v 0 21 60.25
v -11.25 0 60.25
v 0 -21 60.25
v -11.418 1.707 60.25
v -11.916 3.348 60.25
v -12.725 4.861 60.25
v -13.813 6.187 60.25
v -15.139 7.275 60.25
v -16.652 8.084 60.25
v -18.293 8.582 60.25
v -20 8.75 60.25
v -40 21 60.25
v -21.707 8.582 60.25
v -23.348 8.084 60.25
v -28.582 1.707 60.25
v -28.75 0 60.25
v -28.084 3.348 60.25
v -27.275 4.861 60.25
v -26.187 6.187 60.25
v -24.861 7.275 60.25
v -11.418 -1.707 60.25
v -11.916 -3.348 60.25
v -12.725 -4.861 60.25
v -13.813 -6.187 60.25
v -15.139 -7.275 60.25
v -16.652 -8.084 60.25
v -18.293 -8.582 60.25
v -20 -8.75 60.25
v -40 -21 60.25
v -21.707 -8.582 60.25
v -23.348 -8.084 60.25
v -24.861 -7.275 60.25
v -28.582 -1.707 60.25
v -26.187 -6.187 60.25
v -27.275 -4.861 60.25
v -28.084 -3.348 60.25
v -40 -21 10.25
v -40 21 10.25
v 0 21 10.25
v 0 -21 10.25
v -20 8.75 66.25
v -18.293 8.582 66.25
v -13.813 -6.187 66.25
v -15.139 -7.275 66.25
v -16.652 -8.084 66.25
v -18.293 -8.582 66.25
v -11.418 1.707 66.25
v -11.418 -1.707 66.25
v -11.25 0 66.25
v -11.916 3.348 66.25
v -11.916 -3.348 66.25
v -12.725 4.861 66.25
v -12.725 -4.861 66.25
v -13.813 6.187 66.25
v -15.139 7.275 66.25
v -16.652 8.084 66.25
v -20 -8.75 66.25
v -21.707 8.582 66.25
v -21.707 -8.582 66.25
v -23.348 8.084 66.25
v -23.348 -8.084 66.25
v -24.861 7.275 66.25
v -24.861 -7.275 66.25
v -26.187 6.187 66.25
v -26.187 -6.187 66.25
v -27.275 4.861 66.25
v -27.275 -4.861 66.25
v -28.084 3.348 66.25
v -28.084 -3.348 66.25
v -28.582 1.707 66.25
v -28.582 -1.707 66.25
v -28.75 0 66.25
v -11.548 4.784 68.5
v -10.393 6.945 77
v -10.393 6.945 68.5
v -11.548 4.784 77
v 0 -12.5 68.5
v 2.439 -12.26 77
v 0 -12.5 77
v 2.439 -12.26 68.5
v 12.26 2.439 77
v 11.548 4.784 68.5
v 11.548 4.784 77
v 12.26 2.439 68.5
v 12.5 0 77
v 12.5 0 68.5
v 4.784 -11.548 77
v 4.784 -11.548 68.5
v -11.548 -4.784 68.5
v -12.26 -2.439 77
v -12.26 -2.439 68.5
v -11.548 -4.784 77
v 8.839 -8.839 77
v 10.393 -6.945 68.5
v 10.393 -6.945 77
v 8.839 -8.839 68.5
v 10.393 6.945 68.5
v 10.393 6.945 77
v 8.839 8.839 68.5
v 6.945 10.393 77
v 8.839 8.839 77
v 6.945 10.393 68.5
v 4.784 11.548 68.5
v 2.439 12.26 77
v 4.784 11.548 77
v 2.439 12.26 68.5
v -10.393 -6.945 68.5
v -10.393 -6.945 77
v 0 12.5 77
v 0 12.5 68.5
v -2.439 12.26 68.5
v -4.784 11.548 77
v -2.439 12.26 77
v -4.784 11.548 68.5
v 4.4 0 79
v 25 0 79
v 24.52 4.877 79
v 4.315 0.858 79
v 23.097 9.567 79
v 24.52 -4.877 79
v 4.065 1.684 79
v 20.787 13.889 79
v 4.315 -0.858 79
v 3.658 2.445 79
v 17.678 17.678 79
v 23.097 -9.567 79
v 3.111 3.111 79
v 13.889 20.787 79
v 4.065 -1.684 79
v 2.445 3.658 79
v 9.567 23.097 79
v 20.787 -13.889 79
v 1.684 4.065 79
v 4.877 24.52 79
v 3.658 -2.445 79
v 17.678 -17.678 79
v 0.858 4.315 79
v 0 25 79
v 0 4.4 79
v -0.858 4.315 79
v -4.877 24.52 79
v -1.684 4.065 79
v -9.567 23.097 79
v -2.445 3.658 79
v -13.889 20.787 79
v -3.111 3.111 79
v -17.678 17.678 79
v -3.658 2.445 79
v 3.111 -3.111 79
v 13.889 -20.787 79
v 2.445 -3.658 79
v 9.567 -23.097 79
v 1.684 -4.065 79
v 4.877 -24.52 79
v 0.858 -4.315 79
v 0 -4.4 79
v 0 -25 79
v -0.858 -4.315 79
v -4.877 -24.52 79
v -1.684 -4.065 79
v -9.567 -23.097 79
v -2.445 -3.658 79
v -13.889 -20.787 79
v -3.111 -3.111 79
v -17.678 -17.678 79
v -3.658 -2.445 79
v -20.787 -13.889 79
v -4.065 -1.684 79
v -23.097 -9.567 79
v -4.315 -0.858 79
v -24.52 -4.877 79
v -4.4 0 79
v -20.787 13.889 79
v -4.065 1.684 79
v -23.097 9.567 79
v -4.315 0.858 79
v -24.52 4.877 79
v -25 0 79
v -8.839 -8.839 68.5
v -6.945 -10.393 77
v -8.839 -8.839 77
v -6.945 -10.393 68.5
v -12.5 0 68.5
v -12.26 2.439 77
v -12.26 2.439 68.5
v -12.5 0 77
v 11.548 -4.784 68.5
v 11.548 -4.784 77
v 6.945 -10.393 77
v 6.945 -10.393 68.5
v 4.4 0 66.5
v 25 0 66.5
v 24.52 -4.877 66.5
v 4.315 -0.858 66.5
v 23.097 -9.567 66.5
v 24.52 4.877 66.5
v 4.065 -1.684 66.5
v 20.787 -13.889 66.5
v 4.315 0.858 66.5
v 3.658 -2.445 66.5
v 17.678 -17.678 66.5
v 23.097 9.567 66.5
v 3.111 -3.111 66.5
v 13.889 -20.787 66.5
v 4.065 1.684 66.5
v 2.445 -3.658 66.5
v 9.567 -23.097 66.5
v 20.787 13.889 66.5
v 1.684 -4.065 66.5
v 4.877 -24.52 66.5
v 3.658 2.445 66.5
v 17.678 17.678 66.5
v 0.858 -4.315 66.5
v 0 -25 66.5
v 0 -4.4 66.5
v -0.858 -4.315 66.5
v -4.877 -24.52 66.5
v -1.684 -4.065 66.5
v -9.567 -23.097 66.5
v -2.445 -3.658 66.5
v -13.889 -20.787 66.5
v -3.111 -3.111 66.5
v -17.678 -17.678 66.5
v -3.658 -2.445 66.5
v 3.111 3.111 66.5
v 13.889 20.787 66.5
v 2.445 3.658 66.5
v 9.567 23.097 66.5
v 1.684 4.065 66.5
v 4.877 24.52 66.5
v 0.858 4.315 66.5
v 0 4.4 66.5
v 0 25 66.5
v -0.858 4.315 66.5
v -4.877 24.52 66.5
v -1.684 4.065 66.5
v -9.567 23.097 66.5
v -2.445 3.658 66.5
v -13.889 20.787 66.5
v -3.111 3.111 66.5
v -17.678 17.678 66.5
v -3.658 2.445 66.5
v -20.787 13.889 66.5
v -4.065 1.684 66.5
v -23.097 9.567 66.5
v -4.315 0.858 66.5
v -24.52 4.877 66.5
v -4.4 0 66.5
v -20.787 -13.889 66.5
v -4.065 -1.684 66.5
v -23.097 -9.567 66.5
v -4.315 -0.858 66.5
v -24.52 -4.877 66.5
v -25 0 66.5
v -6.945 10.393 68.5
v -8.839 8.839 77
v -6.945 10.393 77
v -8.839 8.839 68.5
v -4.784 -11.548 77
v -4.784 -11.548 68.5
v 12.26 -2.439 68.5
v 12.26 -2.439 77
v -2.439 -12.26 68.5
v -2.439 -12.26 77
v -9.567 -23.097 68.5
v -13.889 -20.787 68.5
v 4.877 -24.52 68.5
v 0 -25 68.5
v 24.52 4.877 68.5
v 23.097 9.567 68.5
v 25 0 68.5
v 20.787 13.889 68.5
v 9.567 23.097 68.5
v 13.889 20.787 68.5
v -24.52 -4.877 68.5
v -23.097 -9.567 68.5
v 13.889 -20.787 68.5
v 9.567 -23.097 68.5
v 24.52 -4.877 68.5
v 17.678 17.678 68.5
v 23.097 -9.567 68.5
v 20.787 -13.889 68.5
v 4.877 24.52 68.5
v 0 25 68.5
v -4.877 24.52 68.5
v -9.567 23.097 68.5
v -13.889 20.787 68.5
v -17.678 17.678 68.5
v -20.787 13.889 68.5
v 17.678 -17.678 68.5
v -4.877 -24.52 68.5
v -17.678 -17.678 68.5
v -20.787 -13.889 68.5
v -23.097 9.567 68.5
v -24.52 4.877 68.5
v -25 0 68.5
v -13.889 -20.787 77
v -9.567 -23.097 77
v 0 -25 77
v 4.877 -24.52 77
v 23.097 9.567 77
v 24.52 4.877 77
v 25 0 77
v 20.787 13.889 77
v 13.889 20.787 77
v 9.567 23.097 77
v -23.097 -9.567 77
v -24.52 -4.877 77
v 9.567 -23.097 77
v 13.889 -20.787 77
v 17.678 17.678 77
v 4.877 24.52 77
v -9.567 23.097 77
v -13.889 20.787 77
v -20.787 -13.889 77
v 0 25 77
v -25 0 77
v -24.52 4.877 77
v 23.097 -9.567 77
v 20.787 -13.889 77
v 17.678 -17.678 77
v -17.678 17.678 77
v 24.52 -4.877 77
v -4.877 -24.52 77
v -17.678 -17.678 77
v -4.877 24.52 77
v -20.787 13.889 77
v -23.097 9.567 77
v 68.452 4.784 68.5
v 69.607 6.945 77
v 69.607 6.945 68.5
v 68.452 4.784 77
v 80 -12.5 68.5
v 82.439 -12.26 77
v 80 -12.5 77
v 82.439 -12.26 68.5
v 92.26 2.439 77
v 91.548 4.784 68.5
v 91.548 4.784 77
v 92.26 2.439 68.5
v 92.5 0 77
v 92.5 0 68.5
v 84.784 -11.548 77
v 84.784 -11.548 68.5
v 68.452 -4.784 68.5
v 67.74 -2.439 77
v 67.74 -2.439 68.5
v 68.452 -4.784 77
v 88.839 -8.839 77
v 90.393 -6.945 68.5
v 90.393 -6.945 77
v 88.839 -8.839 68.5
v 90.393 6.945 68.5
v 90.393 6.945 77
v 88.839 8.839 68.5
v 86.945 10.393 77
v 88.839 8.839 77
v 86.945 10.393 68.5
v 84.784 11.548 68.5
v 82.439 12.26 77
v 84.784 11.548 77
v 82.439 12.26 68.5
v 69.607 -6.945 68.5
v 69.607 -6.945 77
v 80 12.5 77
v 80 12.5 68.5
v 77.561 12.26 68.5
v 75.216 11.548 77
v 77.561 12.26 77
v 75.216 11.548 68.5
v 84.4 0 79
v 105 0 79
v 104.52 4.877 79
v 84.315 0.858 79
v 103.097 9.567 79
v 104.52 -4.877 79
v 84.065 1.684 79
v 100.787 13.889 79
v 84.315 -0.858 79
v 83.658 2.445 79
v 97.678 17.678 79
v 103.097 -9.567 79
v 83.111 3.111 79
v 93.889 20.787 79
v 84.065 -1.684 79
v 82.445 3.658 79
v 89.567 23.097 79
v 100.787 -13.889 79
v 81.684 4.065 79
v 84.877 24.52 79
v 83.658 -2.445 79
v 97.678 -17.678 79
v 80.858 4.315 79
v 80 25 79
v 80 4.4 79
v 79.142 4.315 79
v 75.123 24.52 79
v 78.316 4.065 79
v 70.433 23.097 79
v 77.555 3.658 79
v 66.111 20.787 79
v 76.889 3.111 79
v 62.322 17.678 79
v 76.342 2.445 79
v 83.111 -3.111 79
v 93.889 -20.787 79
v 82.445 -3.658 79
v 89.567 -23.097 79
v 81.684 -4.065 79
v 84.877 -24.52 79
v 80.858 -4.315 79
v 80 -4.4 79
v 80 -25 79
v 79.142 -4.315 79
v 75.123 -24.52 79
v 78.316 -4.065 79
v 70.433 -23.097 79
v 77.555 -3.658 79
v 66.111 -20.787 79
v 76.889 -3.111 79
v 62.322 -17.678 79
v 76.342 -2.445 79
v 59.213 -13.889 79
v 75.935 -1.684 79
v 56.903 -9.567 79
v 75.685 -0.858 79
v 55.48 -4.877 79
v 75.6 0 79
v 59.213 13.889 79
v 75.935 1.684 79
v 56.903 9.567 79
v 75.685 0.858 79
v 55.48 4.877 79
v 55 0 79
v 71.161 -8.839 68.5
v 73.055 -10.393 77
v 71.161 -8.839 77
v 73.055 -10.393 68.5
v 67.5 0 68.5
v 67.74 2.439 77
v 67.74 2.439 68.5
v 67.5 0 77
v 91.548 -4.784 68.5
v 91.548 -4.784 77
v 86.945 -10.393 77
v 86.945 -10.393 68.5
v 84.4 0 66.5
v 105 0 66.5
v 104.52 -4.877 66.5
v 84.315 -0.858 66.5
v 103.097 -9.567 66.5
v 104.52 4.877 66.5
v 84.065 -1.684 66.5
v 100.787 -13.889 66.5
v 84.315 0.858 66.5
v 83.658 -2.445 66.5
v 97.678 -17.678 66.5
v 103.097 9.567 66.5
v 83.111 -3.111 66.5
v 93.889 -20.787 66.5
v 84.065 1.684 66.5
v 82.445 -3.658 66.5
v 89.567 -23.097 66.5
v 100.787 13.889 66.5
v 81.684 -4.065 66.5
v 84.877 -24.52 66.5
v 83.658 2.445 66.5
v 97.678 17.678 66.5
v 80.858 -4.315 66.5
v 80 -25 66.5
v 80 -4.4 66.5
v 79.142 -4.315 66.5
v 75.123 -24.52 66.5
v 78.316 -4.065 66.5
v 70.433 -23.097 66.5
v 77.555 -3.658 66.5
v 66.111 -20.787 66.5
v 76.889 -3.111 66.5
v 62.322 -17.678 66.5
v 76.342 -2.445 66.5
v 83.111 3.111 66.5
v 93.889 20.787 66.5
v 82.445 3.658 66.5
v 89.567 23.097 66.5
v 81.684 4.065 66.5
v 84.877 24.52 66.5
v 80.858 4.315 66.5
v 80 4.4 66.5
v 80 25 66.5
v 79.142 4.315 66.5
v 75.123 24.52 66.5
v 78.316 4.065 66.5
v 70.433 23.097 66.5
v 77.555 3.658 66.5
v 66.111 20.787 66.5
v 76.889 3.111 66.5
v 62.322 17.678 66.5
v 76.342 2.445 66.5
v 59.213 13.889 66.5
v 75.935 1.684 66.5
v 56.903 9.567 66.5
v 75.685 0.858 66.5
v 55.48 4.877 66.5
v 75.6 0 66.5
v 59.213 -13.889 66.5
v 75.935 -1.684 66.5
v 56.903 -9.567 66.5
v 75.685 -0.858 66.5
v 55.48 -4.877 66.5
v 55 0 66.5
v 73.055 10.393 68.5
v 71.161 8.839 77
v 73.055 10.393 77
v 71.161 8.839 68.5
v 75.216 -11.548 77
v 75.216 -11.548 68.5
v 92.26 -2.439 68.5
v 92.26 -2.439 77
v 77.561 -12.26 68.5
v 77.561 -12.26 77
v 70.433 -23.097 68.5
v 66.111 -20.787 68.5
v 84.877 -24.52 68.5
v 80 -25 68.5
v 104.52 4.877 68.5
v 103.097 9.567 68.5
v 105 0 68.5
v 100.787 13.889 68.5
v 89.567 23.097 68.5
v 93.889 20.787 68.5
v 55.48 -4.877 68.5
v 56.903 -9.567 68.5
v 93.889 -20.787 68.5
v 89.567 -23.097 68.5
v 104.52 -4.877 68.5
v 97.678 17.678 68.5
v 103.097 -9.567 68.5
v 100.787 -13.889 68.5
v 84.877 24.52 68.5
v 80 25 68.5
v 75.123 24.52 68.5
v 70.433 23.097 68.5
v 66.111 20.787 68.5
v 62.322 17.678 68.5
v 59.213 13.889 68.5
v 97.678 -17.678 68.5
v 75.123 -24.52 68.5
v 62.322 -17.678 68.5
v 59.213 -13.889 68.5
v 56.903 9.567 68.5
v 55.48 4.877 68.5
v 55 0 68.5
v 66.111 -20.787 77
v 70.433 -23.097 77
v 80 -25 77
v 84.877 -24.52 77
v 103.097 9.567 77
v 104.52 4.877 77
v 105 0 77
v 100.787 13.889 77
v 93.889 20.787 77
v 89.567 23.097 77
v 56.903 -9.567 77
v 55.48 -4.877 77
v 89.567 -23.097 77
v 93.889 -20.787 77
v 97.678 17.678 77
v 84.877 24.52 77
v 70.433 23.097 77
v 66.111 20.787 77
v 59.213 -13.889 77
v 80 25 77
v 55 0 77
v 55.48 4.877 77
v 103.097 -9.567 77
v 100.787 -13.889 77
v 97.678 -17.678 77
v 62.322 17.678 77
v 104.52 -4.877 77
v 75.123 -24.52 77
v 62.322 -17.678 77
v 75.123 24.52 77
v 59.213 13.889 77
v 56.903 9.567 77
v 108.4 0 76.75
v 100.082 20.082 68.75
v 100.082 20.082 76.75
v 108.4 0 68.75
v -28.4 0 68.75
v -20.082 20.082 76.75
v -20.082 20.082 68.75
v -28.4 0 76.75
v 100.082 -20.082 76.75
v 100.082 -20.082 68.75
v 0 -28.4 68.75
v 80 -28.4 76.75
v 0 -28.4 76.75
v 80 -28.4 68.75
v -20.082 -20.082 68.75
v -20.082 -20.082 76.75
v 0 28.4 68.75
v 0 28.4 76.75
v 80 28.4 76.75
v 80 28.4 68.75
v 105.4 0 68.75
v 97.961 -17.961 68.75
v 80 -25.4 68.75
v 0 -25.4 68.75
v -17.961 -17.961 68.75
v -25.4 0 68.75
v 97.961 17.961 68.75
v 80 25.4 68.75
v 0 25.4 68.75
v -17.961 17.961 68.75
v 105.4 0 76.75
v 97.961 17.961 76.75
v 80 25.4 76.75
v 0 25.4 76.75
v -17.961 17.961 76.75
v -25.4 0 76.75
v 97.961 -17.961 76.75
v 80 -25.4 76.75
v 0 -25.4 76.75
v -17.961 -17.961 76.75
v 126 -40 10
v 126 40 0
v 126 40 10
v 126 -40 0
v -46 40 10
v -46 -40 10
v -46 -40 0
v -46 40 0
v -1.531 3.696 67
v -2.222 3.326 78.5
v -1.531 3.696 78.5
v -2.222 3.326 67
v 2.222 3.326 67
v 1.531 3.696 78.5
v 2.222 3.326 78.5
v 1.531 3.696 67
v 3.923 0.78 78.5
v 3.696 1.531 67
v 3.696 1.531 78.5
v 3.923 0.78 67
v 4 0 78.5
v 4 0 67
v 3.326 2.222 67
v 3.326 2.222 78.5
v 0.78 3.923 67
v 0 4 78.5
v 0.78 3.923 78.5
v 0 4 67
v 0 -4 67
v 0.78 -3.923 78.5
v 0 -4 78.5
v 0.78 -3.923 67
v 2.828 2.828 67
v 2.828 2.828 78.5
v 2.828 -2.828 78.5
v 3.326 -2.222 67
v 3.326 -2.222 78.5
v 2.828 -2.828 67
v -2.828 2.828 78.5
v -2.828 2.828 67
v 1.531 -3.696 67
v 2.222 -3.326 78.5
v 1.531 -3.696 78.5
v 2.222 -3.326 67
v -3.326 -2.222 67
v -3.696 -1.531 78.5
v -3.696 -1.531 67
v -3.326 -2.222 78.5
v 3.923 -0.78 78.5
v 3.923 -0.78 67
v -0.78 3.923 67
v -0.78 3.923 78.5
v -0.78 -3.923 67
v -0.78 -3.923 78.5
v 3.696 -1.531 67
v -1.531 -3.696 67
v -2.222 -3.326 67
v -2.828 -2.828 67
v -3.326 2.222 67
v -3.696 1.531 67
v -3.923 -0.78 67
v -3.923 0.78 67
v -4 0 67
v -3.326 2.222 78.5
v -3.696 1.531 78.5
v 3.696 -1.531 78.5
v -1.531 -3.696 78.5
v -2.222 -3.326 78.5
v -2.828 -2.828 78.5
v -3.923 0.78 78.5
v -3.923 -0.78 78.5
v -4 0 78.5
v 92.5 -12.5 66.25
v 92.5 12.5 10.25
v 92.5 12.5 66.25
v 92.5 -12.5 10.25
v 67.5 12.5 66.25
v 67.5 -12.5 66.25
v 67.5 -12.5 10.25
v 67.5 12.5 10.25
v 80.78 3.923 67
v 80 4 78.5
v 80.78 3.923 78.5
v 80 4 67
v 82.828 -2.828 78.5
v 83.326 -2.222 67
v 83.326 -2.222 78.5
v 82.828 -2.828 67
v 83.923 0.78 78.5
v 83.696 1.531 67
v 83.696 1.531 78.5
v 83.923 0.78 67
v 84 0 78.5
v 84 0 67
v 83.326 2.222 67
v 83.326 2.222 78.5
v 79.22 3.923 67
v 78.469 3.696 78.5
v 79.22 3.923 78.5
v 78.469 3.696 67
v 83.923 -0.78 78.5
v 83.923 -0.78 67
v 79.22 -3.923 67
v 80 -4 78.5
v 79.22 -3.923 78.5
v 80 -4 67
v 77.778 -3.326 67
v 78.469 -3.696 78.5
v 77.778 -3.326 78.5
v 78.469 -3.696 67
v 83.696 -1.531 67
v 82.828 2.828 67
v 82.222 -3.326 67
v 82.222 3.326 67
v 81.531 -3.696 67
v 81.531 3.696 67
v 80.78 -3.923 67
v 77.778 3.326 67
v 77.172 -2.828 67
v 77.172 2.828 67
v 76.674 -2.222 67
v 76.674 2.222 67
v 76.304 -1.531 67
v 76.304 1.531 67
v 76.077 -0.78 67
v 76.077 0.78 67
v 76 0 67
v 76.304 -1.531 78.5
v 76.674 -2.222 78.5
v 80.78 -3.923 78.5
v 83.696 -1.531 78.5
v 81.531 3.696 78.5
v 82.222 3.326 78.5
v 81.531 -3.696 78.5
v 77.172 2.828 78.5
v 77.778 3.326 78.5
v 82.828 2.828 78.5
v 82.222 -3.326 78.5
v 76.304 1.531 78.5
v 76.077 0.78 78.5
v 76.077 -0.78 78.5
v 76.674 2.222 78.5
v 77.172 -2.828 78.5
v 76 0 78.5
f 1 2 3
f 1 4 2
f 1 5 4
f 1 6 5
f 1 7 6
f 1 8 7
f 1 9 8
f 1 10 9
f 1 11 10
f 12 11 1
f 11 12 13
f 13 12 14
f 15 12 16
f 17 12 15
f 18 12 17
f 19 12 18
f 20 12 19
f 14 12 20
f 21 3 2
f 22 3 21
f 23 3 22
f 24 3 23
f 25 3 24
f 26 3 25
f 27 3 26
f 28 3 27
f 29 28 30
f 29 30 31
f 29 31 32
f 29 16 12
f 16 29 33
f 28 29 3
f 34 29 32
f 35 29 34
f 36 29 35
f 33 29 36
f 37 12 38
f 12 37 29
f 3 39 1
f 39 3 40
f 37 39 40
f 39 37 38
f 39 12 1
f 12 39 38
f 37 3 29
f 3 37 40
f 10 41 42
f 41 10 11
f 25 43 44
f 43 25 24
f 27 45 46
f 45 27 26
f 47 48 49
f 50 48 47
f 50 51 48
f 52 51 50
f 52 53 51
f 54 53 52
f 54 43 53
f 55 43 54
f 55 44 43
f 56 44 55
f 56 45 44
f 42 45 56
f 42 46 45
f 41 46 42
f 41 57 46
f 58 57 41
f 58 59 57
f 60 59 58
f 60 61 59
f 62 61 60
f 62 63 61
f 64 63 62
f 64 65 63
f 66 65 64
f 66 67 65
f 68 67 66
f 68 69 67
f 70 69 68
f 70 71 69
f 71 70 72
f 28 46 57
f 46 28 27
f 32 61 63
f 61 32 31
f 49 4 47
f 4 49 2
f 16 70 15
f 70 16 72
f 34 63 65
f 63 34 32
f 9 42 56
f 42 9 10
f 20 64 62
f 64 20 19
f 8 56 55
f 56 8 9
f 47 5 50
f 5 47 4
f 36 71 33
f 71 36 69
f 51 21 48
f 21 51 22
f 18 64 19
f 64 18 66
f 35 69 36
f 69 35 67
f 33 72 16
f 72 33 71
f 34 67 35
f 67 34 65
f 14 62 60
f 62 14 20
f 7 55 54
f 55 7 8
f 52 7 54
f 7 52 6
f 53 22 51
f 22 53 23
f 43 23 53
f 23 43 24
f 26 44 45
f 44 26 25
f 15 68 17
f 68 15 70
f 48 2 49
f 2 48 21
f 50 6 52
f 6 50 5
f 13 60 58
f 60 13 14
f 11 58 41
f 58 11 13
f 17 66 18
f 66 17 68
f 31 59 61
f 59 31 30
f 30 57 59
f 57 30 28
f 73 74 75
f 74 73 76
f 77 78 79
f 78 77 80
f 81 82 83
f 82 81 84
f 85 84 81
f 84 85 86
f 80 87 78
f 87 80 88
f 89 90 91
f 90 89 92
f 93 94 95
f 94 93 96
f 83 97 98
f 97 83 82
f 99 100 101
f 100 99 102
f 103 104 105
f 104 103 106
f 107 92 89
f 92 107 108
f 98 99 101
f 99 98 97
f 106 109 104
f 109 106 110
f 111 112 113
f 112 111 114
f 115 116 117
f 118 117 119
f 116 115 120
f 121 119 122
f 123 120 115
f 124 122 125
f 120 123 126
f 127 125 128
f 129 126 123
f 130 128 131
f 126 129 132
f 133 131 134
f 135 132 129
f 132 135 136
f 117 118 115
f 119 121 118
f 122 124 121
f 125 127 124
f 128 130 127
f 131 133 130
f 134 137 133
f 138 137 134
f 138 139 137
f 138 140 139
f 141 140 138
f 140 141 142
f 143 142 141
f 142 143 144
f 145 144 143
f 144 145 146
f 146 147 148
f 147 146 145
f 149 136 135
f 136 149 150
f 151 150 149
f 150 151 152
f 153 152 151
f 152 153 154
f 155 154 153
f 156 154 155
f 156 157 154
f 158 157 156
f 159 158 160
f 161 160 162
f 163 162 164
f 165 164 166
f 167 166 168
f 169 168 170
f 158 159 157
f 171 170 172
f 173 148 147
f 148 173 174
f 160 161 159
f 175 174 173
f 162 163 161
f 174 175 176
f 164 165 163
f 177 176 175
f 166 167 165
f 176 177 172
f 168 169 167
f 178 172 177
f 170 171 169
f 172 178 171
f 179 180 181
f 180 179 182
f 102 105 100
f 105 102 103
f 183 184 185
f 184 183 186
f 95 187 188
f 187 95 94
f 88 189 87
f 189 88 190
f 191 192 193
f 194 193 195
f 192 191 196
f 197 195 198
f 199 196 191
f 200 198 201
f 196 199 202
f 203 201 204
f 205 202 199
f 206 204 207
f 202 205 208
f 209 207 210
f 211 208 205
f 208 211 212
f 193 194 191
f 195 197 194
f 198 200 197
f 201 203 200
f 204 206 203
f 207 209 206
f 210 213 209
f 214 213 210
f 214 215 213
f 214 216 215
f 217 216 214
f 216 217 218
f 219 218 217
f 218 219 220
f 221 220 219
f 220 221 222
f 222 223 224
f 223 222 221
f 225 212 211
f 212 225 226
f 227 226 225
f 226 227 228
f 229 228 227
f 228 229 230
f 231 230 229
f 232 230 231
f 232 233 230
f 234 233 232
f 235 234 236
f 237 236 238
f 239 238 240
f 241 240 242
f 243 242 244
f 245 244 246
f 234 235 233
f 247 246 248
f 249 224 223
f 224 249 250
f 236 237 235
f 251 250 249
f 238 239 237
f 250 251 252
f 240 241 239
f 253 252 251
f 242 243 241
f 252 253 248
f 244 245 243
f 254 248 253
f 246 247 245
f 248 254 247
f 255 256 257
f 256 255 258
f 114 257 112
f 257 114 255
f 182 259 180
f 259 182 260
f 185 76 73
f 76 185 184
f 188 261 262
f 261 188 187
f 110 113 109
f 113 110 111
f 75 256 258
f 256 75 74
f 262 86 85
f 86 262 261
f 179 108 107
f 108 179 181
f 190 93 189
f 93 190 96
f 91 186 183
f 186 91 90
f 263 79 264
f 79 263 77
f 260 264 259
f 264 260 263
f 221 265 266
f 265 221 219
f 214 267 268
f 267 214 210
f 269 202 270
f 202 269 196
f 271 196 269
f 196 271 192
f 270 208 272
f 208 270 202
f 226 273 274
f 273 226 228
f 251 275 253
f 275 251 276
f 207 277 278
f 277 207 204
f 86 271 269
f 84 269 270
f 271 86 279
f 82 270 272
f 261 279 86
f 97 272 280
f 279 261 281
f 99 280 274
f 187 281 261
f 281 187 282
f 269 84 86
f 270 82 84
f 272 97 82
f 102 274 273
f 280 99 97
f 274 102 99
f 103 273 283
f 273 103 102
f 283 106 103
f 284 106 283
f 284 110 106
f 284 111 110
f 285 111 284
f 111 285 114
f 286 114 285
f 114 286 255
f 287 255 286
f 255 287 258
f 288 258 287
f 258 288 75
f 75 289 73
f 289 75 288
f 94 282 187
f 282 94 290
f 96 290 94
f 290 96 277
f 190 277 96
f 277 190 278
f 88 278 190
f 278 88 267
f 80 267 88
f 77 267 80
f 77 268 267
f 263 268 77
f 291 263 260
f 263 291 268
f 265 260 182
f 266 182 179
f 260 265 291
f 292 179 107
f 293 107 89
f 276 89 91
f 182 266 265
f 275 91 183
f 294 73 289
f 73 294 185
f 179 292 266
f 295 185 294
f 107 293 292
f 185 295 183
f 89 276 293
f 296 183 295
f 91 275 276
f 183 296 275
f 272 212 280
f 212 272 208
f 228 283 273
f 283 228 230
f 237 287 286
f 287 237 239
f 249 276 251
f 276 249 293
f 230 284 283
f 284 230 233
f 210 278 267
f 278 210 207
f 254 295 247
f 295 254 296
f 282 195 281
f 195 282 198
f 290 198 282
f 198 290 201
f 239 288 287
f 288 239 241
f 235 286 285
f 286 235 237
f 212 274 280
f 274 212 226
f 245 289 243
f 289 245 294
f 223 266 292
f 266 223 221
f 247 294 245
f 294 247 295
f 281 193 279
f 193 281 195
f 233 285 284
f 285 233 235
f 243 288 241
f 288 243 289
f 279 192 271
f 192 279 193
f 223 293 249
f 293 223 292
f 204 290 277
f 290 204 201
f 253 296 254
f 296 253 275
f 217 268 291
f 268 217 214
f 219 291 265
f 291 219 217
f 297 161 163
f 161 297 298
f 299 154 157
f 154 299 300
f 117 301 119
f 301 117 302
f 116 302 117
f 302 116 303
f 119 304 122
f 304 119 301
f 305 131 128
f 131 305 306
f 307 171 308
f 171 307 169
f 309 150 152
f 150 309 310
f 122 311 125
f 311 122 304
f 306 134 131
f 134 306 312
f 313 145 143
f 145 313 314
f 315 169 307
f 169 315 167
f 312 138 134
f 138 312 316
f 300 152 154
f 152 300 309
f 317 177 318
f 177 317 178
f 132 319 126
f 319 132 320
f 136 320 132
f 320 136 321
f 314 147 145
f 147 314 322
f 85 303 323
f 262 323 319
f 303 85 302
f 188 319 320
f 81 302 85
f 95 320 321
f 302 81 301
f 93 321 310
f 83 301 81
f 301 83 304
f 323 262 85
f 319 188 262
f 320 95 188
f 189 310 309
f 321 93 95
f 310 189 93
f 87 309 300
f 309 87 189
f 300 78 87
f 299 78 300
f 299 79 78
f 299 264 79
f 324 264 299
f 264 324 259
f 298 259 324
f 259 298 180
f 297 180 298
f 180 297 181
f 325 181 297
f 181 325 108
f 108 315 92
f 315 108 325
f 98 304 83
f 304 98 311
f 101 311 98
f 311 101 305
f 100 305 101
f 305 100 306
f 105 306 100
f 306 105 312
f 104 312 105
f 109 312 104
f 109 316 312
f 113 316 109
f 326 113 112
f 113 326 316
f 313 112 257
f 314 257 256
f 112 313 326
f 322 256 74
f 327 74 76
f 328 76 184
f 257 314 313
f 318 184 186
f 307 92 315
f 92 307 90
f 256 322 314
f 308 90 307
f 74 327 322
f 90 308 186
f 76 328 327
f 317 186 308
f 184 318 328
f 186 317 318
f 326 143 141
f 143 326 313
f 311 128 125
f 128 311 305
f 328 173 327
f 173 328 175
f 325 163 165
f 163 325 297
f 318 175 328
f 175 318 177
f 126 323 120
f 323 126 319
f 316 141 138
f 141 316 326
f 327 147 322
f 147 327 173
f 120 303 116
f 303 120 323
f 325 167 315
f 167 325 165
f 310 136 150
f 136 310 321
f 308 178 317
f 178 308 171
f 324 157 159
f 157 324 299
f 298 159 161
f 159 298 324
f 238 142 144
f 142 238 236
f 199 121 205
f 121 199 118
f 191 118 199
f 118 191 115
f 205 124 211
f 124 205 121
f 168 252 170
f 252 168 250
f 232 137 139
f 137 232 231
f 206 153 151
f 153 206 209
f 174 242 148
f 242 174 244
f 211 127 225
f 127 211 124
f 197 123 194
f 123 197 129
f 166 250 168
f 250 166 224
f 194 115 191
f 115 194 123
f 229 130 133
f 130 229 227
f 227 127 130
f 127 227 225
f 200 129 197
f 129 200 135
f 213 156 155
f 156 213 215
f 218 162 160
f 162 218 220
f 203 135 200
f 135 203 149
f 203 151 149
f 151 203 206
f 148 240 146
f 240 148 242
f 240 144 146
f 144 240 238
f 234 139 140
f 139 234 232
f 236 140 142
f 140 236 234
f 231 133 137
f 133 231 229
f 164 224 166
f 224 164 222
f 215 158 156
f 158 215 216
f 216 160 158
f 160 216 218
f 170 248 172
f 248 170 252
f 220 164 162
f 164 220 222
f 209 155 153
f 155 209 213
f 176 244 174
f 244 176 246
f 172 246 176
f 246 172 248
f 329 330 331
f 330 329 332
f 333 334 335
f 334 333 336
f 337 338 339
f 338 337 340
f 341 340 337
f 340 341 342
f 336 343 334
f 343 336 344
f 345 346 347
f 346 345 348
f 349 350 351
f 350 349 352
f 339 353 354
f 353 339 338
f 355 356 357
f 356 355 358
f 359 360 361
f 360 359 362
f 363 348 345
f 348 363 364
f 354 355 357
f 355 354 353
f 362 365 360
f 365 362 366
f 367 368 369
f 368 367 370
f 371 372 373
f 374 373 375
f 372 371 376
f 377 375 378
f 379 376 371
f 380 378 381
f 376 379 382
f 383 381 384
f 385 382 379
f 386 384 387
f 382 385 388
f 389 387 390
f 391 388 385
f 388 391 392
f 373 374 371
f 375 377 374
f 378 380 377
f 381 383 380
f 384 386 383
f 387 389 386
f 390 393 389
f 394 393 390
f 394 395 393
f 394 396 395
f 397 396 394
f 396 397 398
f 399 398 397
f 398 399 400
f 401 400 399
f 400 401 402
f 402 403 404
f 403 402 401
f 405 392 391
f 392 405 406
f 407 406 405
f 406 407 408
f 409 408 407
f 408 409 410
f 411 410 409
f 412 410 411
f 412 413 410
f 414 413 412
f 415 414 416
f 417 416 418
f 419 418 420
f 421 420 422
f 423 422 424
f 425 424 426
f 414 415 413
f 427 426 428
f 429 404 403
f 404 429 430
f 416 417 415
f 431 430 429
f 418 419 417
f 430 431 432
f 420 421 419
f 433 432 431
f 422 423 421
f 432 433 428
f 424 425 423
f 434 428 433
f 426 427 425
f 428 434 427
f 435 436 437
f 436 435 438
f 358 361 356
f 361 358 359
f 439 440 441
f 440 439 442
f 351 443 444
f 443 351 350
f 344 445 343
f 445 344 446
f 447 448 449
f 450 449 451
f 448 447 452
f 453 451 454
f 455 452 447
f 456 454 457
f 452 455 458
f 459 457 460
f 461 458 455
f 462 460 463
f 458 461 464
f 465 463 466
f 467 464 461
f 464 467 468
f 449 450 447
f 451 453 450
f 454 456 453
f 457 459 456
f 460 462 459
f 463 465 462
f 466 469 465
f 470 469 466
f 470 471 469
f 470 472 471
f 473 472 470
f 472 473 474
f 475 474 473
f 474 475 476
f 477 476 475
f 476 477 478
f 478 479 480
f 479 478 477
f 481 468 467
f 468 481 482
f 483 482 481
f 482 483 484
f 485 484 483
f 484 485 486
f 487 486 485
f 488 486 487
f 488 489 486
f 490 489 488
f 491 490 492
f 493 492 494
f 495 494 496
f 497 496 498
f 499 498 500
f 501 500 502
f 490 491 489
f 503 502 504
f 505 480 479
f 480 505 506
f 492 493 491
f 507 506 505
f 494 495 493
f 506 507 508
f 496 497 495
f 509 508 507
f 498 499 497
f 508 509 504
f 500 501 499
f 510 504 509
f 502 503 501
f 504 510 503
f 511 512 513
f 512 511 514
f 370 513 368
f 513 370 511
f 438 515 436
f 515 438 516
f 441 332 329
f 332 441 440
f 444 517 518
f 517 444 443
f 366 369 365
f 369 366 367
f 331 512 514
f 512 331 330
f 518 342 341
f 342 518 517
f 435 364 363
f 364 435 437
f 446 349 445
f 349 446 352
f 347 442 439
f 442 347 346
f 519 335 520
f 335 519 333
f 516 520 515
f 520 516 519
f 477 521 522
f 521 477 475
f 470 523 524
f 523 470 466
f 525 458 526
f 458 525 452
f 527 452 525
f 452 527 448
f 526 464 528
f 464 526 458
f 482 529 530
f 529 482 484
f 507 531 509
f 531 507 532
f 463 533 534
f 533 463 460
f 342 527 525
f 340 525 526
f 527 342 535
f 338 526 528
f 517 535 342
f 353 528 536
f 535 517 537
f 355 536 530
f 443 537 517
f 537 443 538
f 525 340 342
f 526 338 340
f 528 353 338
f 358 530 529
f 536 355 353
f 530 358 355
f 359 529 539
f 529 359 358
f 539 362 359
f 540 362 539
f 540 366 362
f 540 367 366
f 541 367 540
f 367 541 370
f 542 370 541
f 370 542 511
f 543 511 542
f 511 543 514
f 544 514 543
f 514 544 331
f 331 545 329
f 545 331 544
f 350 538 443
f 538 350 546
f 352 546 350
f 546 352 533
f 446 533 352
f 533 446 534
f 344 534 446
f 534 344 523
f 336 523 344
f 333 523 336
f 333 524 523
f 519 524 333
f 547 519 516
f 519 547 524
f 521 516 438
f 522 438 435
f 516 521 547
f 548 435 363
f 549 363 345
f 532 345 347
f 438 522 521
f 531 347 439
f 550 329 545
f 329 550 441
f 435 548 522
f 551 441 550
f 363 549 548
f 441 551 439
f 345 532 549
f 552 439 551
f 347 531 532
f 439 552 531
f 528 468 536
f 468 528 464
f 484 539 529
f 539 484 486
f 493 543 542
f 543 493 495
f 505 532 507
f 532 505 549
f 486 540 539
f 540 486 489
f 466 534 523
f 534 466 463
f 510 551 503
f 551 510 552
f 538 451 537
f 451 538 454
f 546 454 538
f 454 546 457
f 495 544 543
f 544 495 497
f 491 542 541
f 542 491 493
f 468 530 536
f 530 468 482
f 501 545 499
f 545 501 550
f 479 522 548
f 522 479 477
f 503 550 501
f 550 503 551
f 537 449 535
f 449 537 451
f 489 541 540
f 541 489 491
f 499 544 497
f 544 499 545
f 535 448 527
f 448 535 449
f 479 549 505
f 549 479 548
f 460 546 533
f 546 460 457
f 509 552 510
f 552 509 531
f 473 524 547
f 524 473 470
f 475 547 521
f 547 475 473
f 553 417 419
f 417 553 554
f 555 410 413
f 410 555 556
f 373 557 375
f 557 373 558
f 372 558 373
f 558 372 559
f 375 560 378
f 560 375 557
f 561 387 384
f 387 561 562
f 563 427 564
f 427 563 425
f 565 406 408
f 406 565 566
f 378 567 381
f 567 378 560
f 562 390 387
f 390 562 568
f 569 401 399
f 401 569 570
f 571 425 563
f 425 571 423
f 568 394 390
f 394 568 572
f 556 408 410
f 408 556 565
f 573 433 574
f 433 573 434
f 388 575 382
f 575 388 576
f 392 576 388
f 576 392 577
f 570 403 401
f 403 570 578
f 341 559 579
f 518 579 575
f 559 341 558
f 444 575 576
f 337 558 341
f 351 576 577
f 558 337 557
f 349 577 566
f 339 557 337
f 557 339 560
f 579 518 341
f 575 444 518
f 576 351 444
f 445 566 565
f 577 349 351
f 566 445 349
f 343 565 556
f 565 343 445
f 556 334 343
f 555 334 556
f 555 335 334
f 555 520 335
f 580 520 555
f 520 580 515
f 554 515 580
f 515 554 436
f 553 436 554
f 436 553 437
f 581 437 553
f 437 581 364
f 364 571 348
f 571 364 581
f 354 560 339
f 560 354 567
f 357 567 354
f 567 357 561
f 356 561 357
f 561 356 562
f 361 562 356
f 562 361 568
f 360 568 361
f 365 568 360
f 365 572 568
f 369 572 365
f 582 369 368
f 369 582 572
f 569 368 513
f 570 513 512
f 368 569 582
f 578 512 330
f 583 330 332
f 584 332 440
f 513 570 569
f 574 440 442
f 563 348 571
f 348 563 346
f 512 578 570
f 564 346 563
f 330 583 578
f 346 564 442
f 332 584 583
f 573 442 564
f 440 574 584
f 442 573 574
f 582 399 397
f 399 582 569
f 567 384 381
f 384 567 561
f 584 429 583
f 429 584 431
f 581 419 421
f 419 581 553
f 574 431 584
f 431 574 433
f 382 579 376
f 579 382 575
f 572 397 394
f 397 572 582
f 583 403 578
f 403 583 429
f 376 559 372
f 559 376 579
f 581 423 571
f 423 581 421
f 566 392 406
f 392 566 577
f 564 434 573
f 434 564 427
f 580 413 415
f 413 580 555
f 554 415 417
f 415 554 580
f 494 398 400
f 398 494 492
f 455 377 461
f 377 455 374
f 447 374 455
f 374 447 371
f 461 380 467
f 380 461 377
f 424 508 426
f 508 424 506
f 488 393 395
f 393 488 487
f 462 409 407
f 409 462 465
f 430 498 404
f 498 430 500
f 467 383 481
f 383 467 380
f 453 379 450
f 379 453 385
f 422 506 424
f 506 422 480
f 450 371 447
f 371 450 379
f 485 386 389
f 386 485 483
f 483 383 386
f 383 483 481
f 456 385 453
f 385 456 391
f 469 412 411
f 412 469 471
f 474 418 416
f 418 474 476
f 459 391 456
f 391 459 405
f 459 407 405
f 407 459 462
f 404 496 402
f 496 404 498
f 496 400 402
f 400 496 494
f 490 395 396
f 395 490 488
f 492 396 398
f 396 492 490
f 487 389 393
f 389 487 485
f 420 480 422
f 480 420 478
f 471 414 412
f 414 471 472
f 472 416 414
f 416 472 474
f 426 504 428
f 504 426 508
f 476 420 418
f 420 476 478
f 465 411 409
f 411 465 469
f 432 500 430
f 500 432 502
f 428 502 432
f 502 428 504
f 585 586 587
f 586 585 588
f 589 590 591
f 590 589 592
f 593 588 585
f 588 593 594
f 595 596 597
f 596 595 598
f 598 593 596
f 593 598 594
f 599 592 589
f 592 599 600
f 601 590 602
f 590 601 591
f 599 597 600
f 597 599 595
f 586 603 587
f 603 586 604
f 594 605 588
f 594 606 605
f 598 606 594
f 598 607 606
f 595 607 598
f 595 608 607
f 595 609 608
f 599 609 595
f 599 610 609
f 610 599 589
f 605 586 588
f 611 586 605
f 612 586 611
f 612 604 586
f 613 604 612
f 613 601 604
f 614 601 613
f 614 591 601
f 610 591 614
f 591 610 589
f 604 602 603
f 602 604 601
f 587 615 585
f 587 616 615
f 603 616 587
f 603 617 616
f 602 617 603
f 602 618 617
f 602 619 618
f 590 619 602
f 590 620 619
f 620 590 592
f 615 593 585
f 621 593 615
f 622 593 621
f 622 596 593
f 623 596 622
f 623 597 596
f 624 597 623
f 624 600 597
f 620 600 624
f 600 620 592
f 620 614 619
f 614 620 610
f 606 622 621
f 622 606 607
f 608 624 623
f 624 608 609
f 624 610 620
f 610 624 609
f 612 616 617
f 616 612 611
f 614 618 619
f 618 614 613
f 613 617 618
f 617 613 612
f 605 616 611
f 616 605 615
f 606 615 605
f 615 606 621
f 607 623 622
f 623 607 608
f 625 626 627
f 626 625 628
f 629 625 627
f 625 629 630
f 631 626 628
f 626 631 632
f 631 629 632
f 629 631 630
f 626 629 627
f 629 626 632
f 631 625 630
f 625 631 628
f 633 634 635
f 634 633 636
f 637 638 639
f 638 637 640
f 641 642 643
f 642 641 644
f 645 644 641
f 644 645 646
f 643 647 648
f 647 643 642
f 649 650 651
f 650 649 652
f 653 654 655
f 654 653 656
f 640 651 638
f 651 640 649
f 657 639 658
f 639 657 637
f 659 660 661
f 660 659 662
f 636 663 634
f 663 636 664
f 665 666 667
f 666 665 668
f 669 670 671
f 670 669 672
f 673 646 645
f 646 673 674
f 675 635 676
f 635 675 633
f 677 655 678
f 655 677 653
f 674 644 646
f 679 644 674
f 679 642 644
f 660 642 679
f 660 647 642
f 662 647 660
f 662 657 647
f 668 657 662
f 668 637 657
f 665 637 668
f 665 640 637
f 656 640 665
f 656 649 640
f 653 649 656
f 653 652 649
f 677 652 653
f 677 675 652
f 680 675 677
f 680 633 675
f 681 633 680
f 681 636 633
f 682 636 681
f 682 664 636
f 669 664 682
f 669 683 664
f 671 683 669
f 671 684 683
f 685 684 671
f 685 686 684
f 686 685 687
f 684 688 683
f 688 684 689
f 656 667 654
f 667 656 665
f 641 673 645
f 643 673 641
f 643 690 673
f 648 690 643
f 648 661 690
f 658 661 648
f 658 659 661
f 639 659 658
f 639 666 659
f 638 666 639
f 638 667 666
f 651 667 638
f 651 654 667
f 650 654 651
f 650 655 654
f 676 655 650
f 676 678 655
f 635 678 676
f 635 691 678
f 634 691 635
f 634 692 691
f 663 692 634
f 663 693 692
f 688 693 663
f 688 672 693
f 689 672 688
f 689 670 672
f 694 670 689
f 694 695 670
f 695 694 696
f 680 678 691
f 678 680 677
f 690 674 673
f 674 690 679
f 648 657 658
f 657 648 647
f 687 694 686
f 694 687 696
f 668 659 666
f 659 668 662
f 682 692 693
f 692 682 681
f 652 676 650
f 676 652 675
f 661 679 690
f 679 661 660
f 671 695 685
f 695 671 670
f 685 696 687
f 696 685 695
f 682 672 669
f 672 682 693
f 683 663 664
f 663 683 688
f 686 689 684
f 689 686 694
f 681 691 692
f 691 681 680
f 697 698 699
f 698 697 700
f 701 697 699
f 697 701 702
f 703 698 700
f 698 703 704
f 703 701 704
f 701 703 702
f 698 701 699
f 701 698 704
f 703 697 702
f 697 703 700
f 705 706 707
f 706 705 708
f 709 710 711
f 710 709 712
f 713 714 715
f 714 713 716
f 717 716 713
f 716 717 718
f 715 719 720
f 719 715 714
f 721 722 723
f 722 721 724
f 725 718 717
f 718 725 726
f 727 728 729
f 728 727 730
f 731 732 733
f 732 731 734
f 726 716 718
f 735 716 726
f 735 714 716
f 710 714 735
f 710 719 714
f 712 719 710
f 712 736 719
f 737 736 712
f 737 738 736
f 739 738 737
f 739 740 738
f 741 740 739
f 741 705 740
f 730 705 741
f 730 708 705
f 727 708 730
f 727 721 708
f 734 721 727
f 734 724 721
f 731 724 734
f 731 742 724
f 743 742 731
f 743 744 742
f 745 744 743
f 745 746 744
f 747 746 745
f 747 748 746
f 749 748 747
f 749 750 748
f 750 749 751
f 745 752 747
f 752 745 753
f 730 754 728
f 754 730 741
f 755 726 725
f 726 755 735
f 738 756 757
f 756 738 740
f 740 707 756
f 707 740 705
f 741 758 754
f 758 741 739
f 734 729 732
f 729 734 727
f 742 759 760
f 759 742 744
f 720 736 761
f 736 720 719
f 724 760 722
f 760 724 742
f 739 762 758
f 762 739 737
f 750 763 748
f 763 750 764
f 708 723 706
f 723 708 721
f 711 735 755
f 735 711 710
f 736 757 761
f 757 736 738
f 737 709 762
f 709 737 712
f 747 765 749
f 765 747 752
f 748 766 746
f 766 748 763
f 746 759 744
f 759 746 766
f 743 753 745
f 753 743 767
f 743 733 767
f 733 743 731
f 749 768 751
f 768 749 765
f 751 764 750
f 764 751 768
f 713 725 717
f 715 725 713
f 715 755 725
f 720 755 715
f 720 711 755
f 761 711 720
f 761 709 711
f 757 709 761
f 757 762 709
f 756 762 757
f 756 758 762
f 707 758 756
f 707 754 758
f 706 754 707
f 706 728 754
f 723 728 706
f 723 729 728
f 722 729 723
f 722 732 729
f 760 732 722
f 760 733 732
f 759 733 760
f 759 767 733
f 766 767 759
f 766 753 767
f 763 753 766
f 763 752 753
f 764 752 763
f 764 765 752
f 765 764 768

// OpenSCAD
$fn = 32;

// ------------------------------------------------------------------------
// Motor belt drive: span 80 mm, pulleys d50, belt 8 mm wide
// Every part is its own module, assembly() places every instance.
// ------------------------------------------------------------------------

// --- part 1 ---
module base_plate() {
  difference() {
    translate([-86, -40, 0]) cube([172, 80, 10]);
  }
}

// --- part 2 ---
module motor() {
  union() {
    translate([-25, -21, 0]) cube([50, 42, 40]);
    translate([28, 0, 20]) rotate([0, 90, 0]) cylinder(h = 6, d = 17.5, center = true);
  }
}

// --- part 3 ---
module drive_shaft() {
  translate([0, 0, -5.75]) cylinder(h = 11.5, d = 8);
}

// --- part 4 ---
module pulley_drive() {
  difference() {
    union() {
      cylinder(h = 12.5, d = 25);
      cylinder(h = 2, d = 50);
      translate([0, 0, 10.5]) cylinder(h = 2, d = 50);
    }
    translate([0, 0, -1]) cylinder(h = 14.5, d = 8.8);
  }
}

// --- part 5 ---
module idler_post() {
  translate([-12.5, -12.5, 0]) cube([25, 25, 56]);
}

// --- part 6 ---
module driven_shaft() {
  translate([0, 0, -5.75]) cylinder(h = 11.5, d = 8);
}

// --- part 7 ---
module pulley_driven() {
  difference() {
    union() {
      cylinder(h = 12.5, d = 25);
      cylinder(h = 2, d = 50);
      translate([0, 0, 10.5]) cylinder(h = 2, d = 50);
    }
    translate([0, 0, -1]) cylinder(h = 14.5, d = 8.8);
  }
}

// --- part 8 ---
module drive_belt() {
  difference() {
    linear_extrude(height = 8) polygon(points = concat([for (a = [90 : 45 : 270]) [28.4 * cos(a), 28.4 * sin(a)]], [for (a = [270 : 45 : 450]) [80 + 28.4 * cos(a), 28.4 * sin(a)]]));
    translate([0, 0, -1]) linear_extrude(height = 10) polygon(points = concat([for (a = [90 : 45 : 270]) [25.4 * cos(a), 25.4 * sin(a)]], [for (a = [270 : 45 : 450]) [80 + 25.4 * cos(a), 25.4 * sin(a)]]));
  }
}

// --- assembly ---
module assembly() {
  color([0.80, 0.24, 0.20]) translate([40, 0, 0]) rotate([0, 0, 0]) base_plate();
  color([0.20, 0.45, 0.75]) translate([0, 0, 35.25]) rotate([0, 270, 0]) motor();
  color([0.25, 0.62, 0.32]) translate([0, 0, 72.75]) rotate([0, 0, 0]) drive_shaft();
  color([0.92, 0.70, 0.18]) translate([0, 0, 66.5]) rotate([0, 0, 0]) pulley_drive();
  color([0.58, 0.35, 0.70]) translate([80, 0, 10.25]) rotate([0, 0, 0]) idler_post();
  color([0.16, 0.66, 0.66]) translate([80, 0, 72.75]) rotate([0, 0, 0]) driven_shaft();
  color([0.85, 0.48, 0.18]) translate([80, 0, 66.5]) rotate([0, 0, 0]) pulley_driven();
  color([0.55, 0.60, 0.65]) translate([0, 0, 68.75]) rotate([0, 0, 0]) drive_belt();
}

assembly();
